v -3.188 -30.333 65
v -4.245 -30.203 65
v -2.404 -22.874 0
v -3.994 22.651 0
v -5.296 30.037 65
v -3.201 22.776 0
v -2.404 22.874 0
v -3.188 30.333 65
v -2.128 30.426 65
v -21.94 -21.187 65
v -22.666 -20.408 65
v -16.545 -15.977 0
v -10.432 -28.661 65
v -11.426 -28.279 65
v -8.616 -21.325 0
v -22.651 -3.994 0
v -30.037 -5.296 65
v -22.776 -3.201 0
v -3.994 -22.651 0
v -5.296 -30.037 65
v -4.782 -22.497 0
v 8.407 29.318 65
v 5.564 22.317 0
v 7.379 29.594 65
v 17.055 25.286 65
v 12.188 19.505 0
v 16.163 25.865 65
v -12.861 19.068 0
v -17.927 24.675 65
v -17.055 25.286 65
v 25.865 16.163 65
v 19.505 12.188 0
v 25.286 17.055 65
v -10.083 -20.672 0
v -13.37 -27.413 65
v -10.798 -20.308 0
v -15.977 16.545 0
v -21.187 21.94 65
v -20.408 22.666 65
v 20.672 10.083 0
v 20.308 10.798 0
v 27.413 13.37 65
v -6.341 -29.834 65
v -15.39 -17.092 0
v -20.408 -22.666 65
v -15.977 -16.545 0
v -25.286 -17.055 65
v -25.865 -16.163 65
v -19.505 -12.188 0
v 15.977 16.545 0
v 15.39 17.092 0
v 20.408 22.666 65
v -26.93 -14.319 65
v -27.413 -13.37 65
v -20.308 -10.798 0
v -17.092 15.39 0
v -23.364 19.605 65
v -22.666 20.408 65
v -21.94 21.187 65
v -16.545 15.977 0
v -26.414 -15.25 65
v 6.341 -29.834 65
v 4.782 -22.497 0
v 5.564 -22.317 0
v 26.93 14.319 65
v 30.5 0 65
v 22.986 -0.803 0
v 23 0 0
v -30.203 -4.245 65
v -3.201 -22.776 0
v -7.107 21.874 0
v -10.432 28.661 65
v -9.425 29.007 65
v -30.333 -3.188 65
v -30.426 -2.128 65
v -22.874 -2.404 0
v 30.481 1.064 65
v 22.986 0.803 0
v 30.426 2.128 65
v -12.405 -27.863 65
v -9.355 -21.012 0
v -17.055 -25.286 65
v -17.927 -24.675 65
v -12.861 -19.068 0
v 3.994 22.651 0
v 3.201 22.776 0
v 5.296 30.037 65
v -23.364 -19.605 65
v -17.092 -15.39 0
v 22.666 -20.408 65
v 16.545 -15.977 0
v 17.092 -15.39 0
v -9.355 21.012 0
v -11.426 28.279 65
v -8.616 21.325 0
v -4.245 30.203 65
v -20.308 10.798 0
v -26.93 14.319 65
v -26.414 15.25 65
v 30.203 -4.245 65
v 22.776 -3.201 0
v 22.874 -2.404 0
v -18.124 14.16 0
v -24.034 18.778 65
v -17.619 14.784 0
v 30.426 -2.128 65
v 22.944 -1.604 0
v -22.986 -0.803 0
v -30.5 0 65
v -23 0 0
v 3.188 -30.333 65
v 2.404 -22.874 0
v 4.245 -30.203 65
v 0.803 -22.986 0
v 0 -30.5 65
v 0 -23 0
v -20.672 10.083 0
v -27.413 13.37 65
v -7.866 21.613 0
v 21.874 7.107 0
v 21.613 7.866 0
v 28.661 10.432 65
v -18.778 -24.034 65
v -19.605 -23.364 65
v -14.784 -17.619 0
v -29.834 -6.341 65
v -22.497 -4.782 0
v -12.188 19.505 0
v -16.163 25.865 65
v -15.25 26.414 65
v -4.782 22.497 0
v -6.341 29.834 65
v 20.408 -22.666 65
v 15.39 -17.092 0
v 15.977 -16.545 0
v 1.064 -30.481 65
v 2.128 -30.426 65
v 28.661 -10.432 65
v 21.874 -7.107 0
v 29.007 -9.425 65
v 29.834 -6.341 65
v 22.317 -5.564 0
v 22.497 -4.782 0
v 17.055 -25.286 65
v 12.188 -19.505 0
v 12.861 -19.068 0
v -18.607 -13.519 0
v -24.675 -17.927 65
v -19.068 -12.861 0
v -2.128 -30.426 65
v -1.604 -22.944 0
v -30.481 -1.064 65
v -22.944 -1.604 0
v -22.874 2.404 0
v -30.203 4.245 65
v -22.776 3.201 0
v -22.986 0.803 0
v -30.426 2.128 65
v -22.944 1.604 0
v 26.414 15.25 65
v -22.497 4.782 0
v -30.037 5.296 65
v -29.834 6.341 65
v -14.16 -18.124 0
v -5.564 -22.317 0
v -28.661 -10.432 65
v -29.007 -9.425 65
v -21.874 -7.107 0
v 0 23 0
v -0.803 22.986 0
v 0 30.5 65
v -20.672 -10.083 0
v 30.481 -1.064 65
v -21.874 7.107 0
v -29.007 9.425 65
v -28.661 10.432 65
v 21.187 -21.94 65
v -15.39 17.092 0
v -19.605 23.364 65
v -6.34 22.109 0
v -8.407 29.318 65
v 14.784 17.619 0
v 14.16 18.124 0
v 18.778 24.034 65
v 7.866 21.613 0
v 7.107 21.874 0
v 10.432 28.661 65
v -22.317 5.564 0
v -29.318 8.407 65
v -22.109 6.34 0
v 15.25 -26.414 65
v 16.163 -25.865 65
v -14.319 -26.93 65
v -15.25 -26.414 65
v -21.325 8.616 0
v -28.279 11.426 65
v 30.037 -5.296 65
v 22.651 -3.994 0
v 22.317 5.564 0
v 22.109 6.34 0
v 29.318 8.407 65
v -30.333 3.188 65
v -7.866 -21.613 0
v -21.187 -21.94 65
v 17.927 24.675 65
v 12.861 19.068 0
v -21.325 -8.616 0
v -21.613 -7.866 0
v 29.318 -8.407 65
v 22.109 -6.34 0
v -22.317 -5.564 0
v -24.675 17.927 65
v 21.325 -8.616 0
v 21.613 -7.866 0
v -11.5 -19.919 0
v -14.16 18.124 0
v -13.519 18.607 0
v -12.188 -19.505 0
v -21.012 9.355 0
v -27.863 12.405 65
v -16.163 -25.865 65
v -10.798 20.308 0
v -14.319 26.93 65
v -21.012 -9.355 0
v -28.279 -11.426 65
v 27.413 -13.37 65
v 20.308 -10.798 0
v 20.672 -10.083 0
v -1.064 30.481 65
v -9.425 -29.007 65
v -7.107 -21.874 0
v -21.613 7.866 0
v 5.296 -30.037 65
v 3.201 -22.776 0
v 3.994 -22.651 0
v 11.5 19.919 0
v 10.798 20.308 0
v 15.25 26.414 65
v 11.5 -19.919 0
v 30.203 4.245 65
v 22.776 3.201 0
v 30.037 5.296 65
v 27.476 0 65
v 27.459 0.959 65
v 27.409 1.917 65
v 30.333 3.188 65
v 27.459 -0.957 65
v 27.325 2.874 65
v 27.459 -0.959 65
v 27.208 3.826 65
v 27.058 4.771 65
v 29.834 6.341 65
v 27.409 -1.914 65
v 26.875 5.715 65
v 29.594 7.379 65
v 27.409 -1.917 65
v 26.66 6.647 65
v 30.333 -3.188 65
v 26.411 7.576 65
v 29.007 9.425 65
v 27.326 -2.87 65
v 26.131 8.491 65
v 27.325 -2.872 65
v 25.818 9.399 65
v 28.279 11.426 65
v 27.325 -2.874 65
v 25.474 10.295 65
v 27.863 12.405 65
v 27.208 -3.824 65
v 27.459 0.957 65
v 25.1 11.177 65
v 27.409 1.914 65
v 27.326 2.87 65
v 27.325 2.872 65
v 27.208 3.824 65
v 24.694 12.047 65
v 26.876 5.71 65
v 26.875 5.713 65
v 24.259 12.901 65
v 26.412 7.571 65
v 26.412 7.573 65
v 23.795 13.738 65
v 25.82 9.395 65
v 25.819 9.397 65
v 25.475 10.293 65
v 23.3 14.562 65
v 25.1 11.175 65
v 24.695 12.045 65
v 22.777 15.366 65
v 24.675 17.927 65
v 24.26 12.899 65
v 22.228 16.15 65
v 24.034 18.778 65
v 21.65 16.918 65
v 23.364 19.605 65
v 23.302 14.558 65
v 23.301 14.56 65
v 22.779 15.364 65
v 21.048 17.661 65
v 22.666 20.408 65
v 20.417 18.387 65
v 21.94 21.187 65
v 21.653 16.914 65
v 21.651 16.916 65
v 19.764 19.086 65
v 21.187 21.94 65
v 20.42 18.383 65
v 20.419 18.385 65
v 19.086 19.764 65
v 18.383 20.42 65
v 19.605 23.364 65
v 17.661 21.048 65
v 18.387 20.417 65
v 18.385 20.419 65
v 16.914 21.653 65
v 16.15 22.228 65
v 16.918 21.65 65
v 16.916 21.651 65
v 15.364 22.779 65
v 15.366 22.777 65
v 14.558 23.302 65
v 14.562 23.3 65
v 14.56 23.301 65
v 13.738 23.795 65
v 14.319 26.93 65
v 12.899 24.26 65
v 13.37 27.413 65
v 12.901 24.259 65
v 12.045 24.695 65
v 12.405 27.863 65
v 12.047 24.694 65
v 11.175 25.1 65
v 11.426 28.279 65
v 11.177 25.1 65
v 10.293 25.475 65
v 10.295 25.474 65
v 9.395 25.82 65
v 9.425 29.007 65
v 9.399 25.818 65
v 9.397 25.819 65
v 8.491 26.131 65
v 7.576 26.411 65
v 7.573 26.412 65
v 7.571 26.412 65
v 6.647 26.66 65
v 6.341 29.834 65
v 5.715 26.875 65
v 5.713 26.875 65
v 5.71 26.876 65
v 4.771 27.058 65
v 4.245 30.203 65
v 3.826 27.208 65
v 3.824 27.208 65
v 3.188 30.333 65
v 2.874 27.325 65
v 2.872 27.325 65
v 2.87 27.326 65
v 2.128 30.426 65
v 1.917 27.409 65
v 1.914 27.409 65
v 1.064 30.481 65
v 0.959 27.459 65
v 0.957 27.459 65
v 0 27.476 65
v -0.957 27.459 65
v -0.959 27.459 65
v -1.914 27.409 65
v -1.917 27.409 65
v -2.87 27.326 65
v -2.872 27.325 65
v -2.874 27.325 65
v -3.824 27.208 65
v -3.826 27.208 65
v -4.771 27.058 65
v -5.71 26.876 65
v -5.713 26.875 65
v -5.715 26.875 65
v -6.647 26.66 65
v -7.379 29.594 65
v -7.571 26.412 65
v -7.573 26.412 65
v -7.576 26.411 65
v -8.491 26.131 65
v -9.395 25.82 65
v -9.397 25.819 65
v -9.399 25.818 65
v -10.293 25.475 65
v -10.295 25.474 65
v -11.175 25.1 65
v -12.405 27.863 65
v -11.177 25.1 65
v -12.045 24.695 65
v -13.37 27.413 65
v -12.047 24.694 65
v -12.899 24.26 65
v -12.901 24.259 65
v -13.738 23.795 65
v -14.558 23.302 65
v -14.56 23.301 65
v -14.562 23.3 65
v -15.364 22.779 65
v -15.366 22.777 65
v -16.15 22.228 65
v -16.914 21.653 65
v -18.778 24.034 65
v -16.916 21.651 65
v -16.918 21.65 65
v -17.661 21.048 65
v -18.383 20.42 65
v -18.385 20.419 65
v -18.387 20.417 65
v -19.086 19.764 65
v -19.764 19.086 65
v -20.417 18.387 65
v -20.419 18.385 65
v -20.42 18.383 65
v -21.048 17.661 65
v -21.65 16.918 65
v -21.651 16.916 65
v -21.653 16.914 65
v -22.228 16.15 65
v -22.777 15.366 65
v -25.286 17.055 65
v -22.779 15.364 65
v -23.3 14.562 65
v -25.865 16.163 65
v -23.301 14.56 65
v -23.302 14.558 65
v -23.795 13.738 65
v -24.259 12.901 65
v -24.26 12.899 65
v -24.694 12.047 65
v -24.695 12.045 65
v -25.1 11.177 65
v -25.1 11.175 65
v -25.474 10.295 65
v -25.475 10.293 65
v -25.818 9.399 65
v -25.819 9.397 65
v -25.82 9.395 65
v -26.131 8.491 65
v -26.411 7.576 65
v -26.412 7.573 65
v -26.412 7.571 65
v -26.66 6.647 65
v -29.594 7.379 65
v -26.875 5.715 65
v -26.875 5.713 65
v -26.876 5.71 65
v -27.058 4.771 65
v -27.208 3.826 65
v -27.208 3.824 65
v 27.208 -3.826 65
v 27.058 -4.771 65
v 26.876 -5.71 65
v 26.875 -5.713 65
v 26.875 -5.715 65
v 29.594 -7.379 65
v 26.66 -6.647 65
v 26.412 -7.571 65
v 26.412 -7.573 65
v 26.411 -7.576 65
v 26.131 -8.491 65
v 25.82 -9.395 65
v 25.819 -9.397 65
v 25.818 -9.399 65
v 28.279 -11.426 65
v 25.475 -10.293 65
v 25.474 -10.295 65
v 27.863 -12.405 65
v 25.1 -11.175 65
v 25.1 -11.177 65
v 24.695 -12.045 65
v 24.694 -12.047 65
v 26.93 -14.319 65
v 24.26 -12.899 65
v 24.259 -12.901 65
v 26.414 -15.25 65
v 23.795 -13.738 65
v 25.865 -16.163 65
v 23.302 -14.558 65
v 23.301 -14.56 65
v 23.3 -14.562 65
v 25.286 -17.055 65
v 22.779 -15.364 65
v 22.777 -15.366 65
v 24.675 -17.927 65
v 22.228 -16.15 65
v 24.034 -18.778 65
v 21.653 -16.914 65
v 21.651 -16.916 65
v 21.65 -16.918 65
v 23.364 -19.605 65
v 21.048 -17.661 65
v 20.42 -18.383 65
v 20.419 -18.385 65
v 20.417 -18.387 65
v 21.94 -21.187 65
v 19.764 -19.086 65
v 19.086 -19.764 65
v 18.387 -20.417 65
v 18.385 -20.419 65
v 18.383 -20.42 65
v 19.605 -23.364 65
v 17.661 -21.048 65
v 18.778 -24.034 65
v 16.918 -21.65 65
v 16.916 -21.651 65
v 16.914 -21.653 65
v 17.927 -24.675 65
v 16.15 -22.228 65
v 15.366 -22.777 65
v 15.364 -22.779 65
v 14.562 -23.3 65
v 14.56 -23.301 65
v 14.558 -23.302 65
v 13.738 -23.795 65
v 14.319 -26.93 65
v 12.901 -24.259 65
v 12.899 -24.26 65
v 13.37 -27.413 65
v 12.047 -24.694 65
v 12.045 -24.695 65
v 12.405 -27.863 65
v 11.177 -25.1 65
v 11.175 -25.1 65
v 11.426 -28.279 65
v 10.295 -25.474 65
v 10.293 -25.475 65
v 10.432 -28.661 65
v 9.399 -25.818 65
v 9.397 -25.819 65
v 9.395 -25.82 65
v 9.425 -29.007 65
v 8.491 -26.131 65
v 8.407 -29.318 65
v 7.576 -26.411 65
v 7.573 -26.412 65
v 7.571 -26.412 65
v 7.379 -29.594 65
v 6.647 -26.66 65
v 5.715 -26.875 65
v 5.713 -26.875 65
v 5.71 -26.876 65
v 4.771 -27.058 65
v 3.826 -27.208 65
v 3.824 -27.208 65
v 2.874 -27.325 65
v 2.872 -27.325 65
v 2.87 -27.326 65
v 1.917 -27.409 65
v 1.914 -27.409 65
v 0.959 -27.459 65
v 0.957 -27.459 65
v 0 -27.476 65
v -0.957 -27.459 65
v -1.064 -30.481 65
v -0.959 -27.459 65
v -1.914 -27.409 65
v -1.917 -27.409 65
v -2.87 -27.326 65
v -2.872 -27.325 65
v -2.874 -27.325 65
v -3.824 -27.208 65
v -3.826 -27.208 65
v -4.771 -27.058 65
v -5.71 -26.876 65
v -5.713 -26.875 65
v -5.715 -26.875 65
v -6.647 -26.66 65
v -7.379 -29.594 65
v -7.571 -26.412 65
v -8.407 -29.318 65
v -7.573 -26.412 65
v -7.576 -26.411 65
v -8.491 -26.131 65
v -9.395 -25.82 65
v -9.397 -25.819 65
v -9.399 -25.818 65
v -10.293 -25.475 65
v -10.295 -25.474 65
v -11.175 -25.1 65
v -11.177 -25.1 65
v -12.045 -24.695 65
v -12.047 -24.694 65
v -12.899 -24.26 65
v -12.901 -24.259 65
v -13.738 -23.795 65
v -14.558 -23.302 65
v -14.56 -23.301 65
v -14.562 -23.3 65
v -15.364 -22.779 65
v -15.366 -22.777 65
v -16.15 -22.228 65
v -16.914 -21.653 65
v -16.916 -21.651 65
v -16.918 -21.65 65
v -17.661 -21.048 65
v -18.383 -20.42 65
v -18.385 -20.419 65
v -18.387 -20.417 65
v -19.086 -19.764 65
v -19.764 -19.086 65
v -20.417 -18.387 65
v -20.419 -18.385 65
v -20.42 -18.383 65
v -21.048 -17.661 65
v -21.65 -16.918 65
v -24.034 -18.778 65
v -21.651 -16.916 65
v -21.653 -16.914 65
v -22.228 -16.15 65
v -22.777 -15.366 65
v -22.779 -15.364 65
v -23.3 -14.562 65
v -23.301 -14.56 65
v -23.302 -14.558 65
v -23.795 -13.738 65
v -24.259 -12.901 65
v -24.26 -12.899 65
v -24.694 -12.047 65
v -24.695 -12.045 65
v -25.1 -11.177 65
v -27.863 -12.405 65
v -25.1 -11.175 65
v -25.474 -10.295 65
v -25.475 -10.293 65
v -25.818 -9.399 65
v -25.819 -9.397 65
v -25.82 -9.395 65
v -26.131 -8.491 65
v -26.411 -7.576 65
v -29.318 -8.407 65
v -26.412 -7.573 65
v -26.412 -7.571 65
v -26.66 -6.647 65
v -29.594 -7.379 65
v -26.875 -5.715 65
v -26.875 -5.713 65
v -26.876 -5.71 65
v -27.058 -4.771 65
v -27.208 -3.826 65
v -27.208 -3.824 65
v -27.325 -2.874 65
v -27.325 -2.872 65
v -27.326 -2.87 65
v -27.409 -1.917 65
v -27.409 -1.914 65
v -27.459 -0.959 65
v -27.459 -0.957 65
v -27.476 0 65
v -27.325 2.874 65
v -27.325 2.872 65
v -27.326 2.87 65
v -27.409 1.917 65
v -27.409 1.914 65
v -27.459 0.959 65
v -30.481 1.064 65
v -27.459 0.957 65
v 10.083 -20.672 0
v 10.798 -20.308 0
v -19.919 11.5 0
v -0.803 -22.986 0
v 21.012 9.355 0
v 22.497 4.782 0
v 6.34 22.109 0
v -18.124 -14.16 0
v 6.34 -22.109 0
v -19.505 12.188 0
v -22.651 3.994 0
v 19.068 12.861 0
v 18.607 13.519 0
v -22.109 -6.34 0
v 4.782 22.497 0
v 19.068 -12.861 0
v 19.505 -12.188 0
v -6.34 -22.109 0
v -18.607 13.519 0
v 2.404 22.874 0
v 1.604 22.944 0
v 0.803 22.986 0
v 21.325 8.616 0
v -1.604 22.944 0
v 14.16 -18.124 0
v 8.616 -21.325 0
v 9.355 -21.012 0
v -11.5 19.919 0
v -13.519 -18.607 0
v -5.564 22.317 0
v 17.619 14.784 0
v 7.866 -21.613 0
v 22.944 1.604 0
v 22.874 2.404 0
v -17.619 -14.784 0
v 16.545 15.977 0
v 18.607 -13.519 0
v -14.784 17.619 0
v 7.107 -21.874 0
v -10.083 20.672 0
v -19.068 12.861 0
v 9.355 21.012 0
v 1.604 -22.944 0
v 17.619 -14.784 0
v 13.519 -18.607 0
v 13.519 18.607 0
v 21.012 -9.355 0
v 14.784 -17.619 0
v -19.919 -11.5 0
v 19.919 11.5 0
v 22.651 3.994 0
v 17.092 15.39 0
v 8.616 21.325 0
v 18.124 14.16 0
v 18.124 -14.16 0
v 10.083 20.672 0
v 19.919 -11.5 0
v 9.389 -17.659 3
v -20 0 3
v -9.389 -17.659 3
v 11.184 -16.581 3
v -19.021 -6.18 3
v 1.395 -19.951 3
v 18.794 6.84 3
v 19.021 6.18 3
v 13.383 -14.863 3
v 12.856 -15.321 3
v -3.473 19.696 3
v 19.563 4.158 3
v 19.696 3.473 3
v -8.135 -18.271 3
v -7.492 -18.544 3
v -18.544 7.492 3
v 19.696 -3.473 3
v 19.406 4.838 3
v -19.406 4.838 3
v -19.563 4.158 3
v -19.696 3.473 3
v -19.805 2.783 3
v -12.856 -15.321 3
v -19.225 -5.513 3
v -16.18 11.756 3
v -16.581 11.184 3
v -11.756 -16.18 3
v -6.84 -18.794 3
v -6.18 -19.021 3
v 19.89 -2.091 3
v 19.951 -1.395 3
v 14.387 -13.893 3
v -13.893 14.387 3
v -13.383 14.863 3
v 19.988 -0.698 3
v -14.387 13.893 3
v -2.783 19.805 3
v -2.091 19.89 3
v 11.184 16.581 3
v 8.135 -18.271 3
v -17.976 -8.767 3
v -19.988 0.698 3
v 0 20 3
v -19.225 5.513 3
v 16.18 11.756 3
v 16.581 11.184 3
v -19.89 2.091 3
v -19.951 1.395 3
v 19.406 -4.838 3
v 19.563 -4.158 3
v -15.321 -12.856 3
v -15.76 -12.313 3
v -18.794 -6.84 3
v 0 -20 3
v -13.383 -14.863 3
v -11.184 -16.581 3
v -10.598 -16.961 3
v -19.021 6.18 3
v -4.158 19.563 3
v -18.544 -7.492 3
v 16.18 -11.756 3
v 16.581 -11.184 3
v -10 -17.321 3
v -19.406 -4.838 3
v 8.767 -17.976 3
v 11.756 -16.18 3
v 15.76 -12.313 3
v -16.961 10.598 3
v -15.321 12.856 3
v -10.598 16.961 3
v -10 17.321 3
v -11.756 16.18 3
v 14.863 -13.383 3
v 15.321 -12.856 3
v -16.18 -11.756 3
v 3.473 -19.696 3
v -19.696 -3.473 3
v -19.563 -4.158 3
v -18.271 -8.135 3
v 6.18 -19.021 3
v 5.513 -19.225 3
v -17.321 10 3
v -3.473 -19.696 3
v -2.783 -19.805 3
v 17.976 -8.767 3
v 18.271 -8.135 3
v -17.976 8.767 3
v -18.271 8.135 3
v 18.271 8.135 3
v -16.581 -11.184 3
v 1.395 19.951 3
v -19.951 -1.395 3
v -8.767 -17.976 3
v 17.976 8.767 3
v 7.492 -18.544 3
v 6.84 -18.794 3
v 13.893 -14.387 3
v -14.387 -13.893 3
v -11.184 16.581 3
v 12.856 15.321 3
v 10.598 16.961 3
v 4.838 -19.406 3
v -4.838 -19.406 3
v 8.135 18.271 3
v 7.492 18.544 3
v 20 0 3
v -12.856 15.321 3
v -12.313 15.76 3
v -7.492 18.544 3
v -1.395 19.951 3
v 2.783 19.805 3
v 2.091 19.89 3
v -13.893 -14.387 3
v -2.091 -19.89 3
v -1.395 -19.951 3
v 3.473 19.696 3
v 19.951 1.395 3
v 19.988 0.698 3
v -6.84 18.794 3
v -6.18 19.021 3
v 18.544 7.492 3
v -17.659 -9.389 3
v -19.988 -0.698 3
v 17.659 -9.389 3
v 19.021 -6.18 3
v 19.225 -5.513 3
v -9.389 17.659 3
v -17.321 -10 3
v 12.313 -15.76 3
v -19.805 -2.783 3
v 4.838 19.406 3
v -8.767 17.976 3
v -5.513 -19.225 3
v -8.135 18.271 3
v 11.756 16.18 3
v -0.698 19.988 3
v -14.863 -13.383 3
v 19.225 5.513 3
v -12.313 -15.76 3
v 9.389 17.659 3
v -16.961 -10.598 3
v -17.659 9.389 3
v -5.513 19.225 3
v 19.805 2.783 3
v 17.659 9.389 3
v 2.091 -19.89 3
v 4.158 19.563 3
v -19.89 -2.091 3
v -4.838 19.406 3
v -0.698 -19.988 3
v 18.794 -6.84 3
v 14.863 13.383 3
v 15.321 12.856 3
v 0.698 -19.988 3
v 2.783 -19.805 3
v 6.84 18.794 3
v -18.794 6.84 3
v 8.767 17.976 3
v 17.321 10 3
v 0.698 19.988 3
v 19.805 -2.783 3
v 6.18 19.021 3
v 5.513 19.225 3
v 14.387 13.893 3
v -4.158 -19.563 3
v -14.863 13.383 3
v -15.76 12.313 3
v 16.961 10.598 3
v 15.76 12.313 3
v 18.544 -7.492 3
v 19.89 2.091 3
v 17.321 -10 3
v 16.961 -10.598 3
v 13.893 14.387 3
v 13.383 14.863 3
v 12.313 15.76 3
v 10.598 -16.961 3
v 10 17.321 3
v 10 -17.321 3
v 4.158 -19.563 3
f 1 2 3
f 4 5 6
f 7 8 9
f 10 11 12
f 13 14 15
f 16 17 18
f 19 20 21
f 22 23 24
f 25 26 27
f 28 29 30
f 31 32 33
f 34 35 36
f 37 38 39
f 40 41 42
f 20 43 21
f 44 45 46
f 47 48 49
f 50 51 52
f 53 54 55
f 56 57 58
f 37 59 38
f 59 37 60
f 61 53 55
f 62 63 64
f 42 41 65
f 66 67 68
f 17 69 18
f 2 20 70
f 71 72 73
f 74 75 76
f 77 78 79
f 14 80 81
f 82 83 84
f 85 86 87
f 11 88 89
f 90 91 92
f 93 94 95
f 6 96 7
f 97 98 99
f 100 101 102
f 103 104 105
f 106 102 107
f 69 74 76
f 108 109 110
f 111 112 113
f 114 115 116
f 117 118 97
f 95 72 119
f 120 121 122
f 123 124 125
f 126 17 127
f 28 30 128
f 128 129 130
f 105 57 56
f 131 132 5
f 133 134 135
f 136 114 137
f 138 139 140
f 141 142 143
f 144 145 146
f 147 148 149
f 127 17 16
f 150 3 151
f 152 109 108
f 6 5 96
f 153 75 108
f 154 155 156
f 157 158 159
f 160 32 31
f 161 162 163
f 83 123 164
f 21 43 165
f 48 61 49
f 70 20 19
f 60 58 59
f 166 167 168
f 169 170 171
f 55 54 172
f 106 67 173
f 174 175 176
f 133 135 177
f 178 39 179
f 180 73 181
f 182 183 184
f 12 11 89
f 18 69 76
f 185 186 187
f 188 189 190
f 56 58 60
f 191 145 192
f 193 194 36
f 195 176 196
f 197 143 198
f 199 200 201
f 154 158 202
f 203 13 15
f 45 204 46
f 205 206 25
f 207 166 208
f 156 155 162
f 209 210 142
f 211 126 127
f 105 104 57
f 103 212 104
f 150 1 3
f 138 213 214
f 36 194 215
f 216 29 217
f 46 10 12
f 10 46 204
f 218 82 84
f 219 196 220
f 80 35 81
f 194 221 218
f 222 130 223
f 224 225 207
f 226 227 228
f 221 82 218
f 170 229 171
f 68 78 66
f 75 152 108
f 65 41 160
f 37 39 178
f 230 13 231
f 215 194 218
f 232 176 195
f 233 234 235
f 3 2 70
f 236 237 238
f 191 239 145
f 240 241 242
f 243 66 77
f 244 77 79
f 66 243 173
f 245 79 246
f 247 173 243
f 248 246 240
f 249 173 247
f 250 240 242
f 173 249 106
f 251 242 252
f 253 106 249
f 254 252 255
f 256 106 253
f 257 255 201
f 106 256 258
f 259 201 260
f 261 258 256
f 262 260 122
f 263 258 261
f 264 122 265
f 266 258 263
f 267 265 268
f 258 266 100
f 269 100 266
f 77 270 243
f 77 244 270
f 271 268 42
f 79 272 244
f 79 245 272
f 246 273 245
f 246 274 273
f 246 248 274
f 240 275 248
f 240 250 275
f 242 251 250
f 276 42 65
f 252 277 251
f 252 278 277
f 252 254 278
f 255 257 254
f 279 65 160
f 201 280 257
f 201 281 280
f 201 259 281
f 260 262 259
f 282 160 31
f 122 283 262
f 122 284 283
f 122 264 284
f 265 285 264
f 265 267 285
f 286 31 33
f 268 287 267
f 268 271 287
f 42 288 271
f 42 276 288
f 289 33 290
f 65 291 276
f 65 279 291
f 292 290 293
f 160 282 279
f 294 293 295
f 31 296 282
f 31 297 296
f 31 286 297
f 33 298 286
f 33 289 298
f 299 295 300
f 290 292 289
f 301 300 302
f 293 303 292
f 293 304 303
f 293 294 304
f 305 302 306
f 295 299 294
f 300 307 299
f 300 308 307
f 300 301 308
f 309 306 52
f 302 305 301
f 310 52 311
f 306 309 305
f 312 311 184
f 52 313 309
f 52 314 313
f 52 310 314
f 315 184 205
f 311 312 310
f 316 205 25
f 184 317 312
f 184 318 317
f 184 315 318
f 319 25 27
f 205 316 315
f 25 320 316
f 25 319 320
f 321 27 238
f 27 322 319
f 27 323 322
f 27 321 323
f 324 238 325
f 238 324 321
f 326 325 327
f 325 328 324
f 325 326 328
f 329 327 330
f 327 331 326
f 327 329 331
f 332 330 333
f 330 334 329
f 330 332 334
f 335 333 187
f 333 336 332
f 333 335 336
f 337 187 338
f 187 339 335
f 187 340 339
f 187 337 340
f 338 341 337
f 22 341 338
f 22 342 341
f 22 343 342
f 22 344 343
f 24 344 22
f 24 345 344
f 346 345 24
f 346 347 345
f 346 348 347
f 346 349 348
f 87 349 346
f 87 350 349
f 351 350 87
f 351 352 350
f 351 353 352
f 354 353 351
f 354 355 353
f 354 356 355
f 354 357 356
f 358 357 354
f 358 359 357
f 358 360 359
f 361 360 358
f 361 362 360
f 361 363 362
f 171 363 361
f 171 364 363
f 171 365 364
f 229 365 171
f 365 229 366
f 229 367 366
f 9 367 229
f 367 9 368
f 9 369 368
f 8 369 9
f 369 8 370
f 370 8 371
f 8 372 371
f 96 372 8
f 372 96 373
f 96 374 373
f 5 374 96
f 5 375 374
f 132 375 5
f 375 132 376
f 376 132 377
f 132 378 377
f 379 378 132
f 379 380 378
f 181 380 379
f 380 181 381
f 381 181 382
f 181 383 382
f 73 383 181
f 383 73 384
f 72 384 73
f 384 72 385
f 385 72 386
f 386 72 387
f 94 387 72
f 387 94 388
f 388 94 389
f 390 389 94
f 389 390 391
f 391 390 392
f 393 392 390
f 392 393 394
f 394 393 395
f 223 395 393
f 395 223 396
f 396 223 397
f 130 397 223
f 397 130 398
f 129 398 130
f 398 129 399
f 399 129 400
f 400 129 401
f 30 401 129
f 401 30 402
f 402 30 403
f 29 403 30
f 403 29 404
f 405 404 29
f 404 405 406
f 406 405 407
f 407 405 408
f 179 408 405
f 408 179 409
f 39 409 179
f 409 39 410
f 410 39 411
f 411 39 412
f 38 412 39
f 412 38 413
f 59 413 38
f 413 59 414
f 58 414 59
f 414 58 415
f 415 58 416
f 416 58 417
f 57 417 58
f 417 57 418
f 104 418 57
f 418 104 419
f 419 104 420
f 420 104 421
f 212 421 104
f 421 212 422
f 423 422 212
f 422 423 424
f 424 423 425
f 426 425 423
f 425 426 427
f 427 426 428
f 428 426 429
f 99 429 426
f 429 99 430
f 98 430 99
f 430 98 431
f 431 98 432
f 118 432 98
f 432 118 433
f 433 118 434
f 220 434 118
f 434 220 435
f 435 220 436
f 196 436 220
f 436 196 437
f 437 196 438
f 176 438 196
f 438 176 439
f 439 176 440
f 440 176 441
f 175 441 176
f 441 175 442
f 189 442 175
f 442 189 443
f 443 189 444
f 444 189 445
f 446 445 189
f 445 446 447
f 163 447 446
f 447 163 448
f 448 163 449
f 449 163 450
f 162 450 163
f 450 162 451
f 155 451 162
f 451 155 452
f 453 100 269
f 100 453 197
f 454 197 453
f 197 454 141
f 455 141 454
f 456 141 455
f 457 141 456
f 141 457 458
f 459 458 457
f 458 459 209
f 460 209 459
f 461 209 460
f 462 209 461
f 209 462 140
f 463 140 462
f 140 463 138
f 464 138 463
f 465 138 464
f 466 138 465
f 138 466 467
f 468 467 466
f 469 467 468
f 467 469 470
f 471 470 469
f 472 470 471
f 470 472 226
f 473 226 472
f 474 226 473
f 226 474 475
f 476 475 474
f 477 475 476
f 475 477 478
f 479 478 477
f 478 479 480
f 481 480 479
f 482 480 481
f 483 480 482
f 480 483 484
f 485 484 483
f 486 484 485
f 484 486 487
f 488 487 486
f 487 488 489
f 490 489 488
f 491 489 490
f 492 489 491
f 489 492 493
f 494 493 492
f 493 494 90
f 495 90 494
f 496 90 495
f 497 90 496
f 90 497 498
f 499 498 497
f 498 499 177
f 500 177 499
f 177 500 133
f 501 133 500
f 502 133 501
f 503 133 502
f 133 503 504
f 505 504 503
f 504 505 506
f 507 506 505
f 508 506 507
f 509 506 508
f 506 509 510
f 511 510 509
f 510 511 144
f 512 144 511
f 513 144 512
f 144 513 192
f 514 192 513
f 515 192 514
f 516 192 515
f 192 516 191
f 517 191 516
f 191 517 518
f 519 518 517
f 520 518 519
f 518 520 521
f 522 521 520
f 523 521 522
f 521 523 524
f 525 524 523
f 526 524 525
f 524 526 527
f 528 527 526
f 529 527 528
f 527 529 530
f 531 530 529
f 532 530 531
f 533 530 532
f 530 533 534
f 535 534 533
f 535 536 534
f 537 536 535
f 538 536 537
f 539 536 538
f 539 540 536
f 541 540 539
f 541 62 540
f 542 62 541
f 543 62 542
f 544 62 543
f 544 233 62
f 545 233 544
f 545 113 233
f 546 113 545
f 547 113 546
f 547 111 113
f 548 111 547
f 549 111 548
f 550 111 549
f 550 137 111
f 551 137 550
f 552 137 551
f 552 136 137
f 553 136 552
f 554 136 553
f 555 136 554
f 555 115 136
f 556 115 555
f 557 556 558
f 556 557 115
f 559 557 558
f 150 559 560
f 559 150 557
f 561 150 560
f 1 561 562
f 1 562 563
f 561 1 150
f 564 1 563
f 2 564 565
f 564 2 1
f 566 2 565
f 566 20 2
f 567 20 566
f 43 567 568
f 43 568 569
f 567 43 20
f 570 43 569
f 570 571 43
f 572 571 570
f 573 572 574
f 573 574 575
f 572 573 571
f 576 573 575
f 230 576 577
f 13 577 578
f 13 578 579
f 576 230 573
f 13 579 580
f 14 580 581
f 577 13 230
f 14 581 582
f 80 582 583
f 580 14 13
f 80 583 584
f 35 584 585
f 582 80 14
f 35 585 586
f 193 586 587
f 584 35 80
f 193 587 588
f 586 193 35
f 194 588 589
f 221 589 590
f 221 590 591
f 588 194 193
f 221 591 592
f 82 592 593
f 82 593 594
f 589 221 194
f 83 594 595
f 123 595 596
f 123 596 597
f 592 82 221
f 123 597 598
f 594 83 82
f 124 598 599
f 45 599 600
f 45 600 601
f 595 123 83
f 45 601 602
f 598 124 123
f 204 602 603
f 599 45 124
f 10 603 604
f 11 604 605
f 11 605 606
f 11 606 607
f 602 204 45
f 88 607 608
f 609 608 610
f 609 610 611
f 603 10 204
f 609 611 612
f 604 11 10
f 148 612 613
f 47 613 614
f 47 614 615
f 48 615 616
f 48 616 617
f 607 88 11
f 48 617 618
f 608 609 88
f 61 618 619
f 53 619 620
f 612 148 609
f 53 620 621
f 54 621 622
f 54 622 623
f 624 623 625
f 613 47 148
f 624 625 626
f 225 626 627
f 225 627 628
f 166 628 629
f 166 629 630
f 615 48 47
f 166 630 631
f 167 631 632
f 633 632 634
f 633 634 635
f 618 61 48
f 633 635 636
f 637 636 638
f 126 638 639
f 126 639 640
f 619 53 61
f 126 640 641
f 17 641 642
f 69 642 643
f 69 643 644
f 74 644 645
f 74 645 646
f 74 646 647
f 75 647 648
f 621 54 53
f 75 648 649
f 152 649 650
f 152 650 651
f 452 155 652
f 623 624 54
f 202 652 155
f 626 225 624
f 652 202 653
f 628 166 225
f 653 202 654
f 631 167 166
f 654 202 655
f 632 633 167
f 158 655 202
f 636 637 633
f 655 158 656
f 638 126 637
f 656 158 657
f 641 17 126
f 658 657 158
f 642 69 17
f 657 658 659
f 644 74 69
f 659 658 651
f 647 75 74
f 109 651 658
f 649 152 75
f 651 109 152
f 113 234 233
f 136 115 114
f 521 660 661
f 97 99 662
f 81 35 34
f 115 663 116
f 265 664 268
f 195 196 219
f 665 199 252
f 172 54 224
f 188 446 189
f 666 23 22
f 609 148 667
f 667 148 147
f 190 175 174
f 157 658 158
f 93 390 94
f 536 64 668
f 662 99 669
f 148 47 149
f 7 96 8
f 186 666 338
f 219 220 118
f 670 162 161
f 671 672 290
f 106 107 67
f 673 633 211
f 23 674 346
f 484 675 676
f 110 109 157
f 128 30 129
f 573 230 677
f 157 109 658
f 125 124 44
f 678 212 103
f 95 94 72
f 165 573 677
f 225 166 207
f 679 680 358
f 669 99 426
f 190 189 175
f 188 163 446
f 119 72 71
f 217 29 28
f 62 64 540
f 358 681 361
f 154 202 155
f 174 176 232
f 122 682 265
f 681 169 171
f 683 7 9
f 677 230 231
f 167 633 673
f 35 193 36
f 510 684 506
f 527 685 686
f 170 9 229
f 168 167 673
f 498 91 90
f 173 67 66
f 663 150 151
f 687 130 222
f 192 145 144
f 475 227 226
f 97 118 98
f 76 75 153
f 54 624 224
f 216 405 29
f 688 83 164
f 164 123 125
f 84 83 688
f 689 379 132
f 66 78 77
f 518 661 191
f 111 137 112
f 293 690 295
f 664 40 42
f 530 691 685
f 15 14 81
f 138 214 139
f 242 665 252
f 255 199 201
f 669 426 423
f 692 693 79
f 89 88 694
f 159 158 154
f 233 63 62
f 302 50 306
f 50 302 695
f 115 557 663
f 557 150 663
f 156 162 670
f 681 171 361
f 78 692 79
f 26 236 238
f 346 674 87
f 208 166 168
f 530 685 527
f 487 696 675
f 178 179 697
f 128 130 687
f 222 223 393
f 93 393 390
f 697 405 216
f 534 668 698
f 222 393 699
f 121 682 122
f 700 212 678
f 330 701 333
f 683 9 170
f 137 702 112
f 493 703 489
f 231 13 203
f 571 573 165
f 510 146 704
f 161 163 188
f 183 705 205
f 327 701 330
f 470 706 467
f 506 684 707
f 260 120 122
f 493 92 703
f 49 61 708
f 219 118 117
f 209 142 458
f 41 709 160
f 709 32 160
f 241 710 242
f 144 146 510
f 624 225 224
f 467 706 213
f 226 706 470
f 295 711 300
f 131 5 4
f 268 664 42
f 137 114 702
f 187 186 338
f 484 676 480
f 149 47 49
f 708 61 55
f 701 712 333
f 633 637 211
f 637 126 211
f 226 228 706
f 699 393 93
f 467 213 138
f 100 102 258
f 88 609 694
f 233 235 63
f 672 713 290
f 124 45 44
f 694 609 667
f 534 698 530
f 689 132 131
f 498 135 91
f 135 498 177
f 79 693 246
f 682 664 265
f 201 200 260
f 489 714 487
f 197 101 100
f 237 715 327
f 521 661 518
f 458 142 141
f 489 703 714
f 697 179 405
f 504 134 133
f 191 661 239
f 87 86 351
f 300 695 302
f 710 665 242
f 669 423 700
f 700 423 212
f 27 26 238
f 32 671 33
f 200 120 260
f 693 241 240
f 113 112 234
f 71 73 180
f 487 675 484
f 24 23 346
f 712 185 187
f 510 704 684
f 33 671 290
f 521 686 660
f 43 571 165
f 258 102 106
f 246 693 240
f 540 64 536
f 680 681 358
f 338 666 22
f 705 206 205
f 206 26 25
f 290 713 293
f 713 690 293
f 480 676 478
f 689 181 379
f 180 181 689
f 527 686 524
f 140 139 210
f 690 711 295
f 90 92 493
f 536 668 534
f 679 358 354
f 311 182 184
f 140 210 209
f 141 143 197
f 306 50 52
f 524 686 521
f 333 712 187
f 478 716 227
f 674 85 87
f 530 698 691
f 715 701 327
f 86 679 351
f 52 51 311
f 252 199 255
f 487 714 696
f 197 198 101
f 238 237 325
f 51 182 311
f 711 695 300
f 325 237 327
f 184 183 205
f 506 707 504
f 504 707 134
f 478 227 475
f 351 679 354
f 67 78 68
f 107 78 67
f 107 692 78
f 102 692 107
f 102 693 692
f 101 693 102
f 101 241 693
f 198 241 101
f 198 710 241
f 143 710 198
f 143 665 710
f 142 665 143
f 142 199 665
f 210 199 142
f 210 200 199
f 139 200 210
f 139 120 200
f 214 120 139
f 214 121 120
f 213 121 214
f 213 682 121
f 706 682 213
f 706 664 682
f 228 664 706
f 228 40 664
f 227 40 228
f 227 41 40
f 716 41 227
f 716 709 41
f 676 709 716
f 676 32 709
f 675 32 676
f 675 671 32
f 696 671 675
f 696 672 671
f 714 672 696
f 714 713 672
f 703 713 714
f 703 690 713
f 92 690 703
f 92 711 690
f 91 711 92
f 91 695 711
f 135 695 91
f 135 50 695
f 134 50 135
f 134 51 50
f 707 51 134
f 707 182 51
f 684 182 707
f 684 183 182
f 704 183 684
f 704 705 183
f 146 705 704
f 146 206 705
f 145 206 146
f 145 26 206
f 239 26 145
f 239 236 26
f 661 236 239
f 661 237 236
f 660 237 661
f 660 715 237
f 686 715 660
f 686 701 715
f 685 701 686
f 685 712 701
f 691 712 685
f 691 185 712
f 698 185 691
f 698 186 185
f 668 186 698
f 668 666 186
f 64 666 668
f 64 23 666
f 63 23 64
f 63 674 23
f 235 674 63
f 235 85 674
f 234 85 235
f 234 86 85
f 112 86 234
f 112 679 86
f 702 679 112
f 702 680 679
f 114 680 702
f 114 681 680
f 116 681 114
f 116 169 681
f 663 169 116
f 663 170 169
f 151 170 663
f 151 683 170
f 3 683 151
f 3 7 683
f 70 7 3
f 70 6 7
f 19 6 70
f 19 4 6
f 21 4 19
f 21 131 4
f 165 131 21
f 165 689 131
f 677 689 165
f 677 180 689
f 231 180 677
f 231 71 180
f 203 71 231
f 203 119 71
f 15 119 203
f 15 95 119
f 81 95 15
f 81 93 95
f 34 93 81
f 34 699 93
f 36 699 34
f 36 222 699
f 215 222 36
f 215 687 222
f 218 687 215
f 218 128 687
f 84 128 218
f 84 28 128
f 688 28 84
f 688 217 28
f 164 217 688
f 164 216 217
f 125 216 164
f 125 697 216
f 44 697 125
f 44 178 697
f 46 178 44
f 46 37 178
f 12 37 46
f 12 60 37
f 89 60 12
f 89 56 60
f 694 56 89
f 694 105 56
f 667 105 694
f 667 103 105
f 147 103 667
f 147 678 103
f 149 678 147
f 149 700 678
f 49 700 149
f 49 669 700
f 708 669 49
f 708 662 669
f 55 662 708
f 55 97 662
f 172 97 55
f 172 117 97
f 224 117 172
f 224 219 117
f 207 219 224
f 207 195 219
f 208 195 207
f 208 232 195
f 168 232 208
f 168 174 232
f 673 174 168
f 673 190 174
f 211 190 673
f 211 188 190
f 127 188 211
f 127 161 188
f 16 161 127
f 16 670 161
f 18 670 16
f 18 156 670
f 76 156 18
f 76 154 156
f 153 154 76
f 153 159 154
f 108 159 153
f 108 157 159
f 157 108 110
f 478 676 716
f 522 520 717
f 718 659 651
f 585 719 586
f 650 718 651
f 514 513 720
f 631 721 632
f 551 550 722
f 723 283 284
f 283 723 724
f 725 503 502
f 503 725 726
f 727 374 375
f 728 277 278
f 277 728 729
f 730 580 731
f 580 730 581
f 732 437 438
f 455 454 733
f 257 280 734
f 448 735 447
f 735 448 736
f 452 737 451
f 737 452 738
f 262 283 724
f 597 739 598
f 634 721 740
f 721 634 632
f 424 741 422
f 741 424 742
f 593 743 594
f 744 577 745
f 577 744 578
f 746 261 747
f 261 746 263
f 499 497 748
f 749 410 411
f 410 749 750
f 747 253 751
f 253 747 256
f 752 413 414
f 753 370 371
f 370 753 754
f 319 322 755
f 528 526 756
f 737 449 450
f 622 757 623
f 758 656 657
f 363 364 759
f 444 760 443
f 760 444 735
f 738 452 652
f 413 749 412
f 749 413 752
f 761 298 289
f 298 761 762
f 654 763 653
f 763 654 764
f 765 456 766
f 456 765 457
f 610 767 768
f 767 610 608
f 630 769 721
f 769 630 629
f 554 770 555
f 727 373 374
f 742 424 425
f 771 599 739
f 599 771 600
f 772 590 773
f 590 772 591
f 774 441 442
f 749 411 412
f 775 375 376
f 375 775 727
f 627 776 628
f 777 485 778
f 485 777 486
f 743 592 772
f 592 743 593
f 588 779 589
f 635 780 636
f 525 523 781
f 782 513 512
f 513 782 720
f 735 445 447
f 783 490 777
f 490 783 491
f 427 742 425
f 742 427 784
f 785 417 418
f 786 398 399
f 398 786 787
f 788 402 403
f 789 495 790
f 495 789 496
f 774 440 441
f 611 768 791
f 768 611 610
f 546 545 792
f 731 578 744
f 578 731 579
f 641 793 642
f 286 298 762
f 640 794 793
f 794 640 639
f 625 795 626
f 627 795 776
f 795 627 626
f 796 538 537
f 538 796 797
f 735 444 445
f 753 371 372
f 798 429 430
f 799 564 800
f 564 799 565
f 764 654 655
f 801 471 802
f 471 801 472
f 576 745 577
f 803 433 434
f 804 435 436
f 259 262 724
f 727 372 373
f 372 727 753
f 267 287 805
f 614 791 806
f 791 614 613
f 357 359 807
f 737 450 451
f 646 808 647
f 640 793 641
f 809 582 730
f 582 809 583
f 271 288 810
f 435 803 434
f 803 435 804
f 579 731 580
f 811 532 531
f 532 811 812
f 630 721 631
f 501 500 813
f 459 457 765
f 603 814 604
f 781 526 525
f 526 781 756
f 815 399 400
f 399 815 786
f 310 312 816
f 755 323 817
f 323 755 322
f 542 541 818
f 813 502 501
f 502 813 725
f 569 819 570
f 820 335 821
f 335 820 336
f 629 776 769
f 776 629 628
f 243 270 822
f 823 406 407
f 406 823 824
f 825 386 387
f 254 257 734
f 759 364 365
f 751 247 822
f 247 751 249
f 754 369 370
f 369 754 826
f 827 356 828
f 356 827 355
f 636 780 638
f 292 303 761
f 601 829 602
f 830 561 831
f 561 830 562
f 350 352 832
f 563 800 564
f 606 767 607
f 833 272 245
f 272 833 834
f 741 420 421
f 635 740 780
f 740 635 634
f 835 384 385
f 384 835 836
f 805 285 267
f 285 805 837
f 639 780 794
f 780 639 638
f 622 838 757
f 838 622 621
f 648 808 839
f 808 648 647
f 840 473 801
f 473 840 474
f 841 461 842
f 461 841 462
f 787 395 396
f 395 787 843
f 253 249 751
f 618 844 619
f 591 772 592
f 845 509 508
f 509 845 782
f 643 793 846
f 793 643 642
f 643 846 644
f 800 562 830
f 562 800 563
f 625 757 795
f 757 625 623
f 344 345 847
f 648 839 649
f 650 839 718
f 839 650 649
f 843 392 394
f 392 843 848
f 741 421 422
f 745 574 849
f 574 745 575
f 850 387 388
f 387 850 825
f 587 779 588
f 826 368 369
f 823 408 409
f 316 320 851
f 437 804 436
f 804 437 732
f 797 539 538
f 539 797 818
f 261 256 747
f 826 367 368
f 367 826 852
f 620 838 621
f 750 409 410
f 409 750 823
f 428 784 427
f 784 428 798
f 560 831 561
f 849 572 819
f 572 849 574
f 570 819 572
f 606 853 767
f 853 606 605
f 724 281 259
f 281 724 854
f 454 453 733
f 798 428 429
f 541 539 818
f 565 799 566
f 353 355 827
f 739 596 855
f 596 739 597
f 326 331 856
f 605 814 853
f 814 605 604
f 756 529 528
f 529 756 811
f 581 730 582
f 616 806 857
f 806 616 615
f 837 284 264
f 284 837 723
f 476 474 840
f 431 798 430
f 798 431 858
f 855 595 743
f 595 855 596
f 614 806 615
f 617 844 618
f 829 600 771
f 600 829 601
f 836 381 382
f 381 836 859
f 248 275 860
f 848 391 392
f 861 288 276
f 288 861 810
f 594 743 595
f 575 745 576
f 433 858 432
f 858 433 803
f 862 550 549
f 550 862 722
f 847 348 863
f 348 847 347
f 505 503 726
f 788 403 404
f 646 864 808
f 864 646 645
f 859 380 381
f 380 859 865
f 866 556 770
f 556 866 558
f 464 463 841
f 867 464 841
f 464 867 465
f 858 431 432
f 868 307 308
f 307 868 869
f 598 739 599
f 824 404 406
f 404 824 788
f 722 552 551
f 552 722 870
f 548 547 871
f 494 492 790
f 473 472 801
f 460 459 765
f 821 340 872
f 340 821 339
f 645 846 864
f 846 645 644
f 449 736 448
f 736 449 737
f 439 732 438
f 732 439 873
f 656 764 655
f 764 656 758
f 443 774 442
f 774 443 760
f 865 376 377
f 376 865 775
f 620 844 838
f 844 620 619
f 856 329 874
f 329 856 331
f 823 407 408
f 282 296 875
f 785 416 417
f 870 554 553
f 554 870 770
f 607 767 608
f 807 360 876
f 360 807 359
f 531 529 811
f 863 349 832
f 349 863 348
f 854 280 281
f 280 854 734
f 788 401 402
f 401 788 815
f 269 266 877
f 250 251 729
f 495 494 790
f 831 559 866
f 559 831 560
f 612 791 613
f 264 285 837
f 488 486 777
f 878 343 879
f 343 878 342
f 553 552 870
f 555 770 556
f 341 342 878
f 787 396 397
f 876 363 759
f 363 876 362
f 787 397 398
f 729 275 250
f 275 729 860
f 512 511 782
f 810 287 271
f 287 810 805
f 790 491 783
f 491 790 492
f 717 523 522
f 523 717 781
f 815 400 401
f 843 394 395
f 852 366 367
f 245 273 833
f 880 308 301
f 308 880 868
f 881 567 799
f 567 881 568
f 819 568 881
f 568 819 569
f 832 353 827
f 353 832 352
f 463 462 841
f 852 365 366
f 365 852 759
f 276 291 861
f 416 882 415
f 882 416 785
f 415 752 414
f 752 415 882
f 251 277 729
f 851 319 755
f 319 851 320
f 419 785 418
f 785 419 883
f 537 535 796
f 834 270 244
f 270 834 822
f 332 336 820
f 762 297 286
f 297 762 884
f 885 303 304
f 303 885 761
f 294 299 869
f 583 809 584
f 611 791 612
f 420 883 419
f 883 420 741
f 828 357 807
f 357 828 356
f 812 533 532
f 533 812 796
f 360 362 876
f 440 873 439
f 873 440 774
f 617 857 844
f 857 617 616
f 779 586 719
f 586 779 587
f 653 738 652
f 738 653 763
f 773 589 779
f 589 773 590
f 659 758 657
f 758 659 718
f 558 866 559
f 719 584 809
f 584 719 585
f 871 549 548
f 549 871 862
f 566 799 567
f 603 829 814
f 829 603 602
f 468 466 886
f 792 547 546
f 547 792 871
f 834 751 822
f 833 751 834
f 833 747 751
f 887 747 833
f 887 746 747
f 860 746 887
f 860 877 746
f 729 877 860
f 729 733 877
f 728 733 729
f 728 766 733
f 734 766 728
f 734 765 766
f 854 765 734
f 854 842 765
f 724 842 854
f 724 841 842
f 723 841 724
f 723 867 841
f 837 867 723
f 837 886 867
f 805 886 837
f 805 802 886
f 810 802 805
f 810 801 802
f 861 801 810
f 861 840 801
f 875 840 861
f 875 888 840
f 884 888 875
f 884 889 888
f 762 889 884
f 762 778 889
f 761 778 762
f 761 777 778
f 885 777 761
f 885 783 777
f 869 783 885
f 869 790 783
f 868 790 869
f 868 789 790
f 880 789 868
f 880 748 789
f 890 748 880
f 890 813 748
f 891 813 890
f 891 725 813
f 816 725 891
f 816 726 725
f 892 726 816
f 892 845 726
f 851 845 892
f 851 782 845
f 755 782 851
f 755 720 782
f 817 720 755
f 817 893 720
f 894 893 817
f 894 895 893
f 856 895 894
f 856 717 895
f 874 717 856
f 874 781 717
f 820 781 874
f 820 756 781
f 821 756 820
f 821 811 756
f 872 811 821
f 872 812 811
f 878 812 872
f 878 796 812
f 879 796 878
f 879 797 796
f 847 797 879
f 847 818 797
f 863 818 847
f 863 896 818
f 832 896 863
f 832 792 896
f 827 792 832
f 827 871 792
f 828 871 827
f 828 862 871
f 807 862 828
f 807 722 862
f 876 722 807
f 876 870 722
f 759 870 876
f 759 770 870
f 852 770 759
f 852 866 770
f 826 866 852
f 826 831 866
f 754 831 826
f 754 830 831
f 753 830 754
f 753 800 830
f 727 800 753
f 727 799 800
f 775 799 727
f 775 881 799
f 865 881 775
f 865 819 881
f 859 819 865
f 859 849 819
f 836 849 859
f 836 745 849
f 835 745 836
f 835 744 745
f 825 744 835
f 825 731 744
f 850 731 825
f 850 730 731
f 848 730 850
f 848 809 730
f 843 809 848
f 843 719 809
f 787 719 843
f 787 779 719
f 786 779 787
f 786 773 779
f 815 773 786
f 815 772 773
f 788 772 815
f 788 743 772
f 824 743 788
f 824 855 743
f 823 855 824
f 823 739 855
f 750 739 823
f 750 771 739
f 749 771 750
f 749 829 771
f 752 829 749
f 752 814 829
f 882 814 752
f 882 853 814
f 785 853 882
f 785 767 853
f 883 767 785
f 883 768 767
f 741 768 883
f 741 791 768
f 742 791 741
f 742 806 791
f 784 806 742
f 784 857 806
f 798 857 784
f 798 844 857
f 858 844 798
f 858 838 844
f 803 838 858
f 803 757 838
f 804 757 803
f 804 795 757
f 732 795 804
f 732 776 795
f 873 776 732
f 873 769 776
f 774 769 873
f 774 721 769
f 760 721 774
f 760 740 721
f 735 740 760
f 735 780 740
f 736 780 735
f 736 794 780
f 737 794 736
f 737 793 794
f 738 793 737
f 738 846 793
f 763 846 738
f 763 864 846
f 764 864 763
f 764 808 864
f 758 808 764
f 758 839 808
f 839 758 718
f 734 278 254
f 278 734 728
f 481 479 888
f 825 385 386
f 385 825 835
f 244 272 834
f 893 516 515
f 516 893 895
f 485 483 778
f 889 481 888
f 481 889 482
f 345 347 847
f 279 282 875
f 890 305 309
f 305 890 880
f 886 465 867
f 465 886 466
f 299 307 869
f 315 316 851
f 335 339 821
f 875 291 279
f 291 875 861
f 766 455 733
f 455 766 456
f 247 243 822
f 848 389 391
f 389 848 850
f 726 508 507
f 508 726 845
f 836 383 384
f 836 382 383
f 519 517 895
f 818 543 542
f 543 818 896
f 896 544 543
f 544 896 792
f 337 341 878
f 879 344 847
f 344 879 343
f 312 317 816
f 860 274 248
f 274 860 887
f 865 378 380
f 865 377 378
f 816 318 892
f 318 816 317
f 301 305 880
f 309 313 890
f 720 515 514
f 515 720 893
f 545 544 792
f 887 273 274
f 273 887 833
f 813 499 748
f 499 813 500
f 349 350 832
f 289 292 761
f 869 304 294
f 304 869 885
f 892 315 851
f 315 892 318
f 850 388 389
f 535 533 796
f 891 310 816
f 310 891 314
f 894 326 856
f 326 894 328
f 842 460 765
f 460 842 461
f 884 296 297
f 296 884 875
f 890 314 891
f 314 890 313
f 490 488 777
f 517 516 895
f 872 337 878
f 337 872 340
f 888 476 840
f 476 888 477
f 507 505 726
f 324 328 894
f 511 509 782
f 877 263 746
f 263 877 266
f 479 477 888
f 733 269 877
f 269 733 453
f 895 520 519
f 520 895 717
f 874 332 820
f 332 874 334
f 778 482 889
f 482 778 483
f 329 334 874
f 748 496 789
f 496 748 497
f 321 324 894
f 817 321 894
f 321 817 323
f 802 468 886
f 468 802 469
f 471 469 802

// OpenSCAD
//Top Diameter
d1=55;
//Bottom Diameter
d2=40;
//Height
h=65;
//Thickness
t=3;

becher(d1=d1,d2=d2,h=h,t=t);

module becher(d1=55,d2=40,h=65,t=3) 
{
  p1=[d2/2,0]; 
  p2=[(d2/2)+t,0]; 
  p3=[(d1/2)+t,h];
  p4=[d1/2,h]; 

  pa=[[0,0],p2,p3,[0,h]];
  pi=[[0,t],[d2/2,t],[d1/2,h+0.2],[0,h+0.2]];

  difference() {
    rotate_extrude($fn=180) polygon(points=pa);
    rotate_extrude($fn=180) polygon(points=pi);
  }
}

// -- This script was derived from becher
// -- (c) 2013 Abdreas Urben (urbenan) 
// -- GPL license
